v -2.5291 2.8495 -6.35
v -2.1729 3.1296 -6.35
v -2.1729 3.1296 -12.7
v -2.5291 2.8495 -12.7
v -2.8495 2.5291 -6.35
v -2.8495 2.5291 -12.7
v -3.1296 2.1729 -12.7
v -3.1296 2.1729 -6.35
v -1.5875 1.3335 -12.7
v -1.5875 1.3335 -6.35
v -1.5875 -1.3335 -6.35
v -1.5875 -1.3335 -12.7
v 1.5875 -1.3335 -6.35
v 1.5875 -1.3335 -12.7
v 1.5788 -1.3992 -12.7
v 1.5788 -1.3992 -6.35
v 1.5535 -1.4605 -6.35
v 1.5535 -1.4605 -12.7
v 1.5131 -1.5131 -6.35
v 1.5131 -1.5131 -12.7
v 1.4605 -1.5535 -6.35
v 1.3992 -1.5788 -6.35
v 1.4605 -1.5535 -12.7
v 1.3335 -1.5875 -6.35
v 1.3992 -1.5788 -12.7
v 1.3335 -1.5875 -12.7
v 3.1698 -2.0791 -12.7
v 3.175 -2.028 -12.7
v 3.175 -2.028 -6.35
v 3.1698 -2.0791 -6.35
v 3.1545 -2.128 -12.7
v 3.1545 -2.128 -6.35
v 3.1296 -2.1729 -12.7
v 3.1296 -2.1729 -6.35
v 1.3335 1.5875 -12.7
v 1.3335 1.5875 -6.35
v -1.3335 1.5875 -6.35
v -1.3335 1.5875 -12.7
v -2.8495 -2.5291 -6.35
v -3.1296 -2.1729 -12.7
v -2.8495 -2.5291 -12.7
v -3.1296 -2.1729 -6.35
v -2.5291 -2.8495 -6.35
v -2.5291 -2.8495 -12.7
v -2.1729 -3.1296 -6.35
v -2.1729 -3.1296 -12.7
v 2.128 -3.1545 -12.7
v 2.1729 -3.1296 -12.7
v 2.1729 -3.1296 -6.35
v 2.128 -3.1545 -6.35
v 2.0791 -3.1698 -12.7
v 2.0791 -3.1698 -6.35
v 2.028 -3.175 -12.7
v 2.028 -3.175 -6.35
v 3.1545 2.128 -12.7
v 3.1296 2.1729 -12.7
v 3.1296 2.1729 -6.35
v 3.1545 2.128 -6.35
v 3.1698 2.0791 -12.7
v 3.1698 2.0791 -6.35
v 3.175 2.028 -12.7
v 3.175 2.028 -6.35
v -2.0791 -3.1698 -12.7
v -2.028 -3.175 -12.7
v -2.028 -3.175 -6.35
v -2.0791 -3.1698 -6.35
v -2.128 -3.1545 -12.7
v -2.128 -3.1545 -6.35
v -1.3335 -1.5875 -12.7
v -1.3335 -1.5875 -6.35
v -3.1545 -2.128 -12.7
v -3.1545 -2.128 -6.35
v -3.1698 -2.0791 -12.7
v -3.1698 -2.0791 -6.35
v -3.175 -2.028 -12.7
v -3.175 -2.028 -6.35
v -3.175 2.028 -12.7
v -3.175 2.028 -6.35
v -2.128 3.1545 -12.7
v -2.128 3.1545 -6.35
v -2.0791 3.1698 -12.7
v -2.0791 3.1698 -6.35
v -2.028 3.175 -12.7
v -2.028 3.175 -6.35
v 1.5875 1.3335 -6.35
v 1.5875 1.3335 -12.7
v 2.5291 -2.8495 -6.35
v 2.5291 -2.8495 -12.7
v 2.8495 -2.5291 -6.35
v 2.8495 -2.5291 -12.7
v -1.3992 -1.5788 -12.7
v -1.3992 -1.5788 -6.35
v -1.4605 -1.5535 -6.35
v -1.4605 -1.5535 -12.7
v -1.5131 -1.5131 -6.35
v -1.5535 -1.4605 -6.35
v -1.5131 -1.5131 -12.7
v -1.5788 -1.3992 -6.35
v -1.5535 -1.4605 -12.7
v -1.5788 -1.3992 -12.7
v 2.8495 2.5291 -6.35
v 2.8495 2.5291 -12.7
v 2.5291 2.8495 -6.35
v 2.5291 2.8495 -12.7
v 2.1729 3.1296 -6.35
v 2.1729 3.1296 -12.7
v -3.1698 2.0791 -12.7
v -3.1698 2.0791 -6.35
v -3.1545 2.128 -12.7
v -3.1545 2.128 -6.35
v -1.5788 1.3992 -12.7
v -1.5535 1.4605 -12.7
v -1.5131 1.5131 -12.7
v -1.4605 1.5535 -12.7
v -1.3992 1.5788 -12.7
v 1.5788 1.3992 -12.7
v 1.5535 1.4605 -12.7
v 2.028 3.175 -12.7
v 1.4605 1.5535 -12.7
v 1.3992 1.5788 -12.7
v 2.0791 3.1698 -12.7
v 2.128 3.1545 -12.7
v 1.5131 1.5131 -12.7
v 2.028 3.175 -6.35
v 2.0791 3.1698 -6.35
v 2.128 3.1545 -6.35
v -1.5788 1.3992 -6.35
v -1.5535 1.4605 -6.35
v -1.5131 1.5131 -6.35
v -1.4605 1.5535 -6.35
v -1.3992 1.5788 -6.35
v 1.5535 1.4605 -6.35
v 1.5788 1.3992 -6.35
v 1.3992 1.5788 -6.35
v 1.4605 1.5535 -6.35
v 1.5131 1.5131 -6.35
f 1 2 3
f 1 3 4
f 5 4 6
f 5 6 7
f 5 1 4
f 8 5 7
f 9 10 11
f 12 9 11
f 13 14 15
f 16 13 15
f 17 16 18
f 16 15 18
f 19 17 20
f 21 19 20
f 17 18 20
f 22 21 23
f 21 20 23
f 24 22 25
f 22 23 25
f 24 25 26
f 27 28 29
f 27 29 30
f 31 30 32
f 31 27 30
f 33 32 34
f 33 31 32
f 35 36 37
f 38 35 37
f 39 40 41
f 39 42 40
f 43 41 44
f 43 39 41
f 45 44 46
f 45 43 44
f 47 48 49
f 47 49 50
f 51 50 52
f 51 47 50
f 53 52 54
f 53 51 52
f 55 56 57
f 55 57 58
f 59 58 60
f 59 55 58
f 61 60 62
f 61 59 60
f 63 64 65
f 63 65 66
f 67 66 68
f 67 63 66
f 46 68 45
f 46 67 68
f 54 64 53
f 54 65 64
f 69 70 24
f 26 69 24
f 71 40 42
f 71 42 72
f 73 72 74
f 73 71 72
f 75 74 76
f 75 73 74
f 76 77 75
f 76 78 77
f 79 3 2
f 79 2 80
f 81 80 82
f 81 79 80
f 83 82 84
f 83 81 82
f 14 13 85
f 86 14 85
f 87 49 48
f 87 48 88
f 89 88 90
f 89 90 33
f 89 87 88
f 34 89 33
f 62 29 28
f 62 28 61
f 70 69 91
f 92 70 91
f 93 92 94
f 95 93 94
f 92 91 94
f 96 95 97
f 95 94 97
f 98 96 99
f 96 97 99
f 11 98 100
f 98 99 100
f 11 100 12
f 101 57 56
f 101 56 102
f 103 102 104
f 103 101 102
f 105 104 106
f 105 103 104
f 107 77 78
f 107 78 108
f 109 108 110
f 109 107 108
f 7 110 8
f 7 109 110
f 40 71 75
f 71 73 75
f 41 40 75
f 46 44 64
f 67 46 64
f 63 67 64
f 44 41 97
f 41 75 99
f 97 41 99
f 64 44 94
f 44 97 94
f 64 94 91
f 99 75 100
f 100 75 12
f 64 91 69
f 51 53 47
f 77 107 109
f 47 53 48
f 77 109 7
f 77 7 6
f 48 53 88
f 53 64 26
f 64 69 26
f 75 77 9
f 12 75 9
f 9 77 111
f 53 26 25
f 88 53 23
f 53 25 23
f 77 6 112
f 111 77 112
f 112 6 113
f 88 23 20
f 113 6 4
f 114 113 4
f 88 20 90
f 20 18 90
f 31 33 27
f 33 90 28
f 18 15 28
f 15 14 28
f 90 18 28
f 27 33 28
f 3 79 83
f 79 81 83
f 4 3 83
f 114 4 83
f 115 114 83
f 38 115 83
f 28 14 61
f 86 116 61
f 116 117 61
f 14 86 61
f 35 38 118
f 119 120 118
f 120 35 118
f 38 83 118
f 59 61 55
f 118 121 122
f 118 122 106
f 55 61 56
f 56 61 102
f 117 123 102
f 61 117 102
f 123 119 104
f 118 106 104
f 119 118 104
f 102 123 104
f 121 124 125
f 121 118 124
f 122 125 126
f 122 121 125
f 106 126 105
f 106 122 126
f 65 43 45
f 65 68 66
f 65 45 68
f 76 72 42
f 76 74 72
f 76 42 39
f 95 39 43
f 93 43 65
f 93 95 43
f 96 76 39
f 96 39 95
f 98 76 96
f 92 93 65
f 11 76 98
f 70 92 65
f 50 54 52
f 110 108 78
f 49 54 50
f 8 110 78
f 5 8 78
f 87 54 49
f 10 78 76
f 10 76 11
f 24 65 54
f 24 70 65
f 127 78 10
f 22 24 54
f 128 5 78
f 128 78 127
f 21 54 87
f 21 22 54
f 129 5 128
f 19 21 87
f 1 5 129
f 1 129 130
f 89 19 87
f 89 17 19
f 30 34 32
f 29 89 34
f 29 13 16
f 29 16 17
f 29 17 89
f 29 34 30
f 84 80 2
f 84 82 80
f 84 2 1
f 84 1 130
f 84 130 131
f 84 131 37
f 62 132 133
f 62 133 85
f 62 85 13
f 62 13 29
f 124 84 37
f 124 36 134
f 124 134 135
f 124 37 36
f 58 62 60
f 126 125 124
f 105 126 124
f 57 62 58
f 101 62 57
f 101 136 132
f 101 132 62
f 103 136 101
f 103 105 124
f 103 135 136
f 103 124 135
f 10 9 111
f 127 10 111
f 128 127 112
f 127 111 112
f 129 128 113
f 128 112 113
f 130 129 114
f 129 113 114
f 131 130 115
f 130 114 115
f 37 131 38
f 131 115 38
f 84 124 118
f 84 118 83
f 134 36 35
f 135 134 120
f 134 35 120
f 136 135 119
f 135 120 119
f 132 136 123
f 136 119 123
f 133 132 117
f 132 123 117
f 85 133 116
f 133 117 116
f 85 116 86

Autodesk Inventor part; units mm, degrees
ref_plane "YZ Plane" through (0, 0, 0) normal (1, 0, 0) x (0, 1, 0)
ref_plane "XZ Plane" through (0, 0, 0) normal (0, 1, 0) x (-1, 0, 0)
ref_plane "XY Plane" through (0, 0, 0) normal (0, 0, 1) x (1, 0, 0)
sketch "Sketch1" plane through (0, 0, 0) normal (0, 0, 1) x (1, 0, 0)
  line L0 (-3.175, -3.175) -> (3.175, -3.175)
  line L1 (3.175, -3.175) -> (3.175, 3.175)
  line L2 (3.175, 3.175) -> (-3.175, 3.175)
  line L3 (-3.175, 3.175) -> (-3.175, -3.175)
  line L4 (-3.175, -3.175) -> (3.175, 3.175) construction
  line L5 (3.175, -3.175) -> (-3.175, 3.175) construction
  circle A0 centre (0, 0) radius 3.81
  point P0 (2.1061, -3.175)
  point P1 (3.175, -2.1061)
  point P2 (3.175, 2.1061)
  point P3 (2.1061, 3.175)
  point P4 (-2.1061, 3.175)
  point P5 (-3.175, 2.1061)
  point P6 (-3.175, -2.1061)
  point P7 (-2.1061, -3.175)
  dimension "d0" = 7.62
  dimension "d1" = 6.35
extrude "Extrusion1" add sketch "Sketch1" against normal blind 12.7 contours A0 L3 L2 L1 L0
sketch "Sketch2" plane through (0, 0, 0) normal (0, 0, 1) x (1, 0, 0)
  arc A0 (-3.175, -2.1061) -> (-2.1061, -3.175) centre (0, 0) ccw construction
  line L0 (-1.5875, -1.5875) -> (1.5875, -1.5875)
  line L1 (1.5875, -1.5875) -> (1.5875, 1.5875)
  line L2 (1.5875, 1.5875) -> (-1.5875, 1.5875)
  line L3 (-1.5875, 1.5875) -> (-1.5875, -1.5875)
  line L4 (-1.5875, -1.5875) -> (1.5875, 1.5875) construction
  line L5 (1.5875, -1.5875) -> (-1.5875, 1.5875) construction
  dimension "d7" = 3.175
extrude "Extrusion2" cut sketch "Sketch2" against normal blind 12.7
fillet "Fillet1" radius 0.254 12 edges at (-1.5875, -1.5875, -6.35) (-1.5875, 1.5875, -6.35) (1.5875, 1.5875, -6.35) (1.5875, -1.5875, -6.35) (2.1061, 3.175, -6.35) (3.175, 2.1061, -6.35) (3.175, -2.1061, -6.35) (2.1061, -3.175, -6.35) (-2.1061, -3.175, -6.35) (-3.175, -2.1061, -6.35) (-3.175, 2.1061, -6.35) (-2.1061, 3.175, -6.35)
sketch "Sketch3" plane through (0, 0, 0) normal (0, 0, 1) x (1, 0, 0)
  line L0 (-7.3828, 5.7639) -> (4.9041, 5.7639)
  line L1 (4.9041, 5.7639) -> (4.9041, -5.3132)
  line L2 (4.9041, -5.3132) -> (-7.3828, -5.3132)
  line L3 (-7.3828, -5.3132) -> (-7.3828, 5.7639)
  point P0 (0, 0)
extrude "Extrusion3" cut sketch "Sketch3" against normal blind 6.35
properties part number "HS Shaft Adapter Square"
